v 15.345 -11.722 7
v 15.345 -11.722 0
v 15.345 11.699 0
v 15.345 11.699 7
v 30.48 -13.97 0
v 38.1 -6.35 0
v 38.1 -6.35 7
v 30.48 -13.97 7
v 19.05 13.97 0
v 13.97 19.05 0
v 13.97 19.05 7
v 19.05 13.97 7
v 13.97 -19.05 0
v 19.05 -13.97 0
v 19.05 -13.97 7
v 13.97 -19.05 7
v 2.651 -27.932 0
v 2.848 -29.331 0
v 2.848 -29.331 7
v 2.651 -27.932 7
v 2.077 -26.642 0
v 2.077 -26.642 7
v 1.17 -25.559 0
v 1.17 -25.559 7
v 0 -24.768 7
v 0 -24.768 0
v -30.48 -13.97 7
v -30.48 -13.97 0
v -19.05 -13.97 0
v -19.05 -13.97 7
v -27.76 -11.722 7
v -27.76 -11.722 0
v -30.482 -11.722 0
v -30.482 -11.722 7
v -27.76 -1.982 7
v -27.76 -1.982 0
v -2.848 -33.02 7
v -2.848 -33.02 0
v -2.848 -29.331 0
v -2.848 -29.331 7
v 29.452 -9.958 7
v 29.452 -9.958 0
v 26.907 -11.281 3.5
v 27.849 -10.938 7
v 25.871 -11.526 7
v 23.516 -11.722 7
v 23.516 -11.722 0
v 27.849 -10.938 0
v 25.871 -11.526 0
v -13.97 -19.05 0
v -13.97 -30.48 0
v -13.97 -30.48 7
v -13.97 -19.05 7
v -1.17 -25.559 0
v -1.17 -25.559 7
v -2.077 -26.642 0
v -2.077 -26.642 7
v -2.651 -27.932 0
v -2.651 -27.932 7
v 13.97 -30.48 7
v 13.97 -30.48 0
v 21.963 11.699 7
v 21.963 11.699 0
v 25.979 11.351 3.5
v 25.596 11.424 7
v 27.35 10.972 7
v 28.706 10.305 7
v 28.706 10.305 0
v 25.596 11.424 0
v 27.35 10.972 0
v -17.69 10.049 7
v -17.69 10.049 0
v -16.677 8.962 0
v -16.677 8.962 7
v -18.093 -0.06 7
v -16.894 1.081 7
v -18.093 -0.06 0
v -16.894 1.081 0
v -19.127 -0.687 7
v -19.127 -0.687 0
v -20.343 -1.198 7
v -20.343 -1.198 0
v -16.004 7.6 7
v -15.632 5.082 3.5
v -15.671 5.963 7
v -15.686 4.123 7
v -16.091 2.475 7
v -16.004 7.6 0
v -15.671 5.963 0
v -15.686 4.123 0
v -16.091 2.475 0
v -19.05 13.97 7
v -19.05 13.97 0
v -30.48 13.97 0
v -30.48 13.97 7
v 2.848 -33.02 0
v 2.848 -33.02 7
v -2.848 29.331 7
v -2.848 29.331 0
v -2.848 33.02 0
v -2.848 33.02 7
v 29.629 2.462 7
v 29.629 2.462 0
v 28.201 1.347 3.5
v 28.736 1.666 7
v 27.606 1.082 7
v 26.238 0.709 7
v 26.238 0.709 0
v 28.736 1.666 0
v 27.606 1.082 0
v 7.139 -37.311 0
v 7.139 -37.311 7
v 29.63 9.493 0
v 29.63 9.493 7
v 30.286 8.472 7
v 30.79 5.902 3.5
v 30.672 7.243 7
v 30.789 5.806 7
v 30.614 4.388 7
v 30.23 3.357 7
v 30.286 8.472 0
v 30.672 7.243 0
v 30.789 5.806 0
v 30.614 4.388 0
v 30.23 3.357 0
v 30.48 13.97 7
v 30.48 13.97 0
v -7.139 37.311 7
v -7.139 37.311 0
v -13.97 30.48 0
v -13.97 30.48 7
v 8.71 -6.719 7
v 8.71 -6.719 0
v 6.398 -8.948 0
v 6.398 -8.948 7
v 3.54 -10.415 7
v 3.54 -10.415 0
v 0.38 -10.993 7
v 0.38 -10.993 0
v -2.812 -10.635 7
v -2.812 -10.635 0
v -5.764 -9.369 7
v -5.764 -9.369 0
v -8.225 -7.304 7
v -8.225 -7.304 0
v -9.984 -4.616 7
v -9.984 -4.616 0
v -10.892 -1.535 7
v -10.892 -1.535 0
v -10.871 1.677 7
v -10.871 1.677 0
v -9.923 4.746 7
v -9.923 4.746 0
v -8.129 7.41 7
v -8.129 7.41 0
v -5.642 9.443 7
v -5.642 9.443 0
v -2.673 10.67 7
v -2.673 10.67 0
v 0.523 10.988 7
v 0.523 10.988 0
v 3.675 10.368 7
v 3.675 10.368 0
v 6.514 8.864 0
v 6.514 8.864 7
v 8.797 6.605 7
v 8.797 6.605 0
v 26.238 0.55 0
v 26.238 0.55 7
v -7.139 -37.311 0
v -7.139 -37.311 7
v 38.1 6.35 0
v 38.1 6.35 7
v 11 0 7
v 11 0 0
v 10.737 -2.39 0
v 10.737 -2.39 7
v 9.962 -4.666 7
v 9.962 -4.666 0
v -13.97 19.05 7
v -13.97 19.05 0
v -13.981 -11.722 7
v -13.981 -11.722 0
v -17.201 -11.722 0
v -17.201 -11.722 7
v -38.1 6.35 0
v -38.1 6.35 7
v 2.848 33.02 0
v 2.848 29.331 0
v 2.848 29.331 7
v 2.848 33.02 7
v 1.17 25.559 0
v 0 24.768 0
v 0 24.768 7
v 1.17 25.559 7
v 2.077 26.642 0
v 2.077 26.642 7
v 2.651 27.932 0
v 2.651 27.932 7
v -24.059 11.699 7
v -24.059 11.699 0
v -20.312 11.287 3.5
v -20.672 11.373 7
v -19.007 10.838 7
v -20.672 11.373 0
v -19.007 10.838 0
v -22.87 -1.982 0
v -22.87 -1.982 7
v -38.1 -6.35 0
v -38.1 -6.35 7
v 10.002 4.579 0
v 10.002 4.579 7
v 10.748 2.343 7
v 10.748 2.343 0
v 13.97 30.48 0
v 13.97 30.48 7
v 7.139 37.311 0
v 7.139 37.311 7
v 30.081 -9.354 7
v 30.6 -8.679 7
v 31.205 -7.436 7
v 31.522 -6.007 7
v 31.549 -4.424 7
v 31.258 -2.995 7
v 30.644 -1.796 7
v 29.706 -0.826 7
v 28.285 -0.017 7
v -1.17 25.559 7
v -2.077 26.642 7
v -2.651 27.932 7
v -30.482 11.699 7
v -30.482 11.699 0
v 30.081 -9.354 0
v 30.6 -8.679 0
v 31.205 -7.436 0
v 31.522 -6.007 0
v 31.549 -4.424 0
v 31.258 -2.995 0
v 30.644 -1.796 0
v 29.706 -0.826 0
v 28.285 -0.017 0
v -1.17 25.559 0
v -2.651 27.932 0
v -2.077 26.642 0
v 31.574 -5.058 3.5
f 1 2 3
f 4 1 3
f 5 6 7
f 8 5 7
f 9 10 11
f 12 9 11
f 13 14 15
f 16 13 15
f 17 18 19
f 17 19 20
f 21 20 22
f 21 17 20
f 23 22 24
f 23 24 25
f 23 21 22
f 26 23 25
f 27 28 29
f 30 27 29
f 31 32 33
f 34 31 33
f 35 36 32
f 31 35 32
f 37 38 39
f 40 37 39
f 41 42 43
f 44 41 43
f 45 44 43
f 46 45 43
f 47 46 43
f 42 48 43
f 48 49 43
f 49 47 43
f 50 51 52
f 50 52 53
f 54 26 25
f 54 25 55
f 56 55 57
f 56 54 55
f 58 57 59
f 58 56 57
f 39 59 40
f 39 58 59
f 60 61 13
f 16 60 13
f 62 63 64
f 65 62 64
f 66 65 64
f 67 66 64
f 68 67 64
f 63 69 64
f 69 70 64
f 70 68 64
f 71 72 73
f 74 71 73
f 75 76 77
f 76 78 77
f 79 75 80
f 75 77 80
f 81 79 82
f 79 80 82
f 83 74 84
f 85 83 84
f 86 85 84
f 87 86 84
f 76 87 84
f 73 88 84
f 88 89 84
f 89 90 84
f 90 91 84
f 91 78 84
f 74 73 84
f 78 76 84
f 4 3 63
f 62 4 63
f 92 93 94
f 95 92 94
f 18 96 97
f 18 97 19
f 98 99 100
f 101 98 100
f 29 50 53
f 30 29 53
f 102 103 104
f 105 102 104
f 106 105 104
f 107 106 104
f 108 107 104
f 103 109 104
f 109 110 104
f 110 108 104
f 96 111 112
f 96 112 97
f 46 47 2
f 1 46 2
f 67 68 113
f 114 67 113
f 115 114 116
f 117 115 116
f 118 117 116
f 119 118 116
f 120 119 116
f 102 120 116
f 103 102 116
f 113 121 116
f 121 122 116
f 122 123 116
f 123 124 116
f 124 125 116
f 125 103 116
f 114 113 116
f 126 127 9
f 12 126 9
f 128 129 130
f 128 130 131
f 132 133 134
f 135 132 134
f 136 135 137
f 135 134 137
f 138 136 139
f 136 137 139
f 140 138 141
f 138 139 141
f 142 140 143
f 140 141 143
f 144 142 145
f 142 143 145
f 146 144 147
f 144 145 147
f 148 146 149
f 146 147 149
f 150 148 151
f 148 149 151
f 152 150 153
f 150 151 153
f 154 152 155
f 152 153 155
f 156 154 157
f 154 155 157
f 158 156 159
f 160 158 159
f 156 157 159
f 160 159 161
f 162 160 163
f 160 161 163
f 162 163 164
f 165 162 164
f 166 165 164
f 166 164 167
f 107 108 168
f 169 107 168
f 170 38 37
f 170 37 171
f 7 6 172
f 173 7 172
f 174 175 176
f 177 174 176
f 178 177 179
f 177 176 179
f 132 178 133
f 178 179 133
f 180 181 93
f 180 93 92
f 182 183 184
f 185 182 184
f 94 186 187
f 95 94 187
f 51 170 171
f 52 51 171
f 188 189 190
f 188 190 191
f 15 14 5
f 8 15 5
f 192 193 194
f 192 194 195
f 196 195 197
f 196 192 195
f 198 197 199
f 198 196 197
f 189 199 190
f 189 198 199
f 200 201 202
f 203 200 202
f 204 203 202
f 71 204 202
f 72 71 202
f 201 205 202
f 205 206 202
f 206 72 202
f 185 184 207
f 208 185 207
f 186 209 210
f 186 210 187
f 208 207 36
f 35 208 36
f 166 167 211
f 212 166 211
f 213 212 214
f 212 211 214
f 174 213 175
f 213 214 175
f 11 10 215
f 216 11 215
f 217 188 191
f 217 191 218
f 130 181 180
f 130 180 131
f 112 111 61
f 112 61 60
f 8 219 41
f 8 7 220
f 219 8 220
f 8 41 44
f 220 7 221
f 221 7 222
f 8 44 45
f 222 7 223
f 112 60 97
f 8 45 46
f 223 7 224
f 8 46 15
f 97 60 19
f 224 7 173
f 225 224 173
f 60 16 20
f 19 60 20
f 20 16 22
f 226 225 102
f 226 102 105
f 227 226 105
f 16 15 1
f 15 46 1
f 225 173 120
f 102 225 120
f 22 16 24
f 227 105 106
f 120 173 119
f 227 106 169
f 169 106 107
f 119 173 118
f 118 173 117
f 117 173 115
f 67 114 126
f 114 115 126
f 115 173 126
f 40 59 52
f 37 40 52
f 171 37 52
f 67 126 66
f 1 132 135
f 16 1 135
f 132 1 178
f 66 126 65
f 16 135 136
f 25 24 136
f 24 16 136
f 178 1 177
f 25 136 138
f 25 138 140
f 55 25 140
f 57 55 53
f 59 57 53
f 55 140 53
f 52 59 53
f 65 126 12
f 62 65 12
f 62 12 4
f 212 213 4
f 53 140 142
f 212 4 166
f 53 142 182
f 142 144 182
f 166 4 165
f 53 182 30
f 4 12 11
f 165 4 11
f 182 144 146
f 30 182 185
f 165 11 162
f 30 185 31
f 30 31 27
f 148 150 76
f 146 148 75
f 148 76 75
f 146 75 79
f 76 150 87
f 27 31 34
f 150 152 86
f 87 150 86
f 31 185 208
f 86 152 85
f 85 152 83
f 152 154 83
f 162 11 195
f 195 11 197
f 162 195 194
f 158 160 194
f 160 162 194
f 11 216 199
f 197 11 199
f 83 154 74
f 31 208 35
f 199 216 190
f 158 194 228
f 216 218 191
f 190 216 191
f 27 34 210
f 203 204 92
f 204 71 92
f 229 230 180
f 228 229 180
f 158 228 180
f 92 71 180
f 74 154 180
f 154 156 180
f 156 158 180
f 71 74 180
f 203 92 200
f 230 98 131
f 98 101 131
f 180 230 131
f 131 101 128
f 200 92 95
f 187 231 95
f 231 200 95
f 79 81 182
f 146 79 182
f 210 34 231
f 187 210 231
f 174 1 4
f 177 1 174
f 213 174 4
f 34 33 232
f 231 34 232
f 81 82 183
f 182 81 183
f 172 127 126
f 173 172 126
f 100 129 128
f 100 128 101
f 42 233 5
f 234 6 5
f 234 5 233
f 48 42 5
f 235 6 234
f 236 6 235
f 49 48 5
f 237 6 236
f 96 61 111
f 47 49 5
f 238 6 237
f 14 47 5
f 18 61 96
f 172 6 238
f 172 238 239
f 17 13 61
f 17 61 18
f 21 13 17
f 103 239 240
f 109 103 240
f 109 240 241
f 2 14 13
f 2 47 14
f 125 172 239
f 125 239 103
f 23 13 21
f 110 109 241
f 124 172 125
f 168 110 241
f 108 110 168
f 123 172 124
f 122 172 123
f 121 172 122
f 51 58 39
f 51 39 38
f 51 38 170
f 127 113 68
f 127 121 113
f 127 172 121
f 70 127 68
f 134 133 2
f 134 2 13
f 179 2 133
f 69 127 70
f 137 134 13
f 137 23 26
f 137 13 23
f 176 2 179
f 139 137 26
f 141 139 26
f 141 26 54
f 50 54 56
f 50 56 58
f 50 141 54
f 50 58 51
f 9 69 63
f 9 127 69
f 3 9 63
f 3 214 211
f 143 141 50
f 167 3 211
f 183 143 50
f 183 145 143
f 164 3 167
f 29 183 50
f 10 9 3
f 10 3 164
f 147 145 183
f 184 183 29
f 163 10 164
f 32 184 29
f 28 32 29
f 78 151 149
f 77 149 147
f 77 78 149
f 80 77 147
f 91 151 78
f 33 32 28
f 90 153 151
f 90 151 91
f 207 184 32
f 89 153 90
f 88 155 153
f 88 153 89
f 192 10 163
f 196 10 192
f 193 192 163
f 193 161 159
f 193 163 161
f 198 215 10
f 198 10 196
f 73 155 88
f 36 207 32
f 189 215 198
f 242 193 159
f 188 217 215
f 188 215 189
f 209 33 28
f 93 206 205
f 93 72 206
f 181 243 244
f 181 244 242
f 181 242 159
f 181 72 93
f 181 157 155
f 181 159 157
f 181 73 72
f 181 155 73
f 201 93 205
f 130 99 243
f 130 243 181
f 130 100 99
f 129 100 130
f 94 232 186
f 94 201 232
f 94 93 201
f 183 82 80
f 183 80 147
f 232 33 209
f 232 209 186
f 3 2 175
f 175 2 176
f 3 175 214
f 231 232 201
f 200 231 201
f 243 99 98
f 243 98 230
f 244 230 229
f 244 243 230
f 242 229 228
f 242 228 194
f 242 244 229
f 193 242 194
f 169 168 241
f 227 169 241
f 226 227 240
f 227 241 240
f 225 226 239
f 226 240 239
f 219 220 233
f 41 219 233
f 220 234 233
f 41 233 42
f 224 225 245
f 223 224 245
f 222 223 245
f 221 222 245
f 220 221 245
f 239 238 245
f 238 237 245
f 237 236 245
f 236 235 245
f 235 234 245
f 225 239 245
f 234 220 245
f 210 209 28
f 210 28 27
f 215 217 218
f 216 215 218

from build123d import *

# Parameters (mm, degrees)
F0_W        = 24.13
F0_H        = 27.94
F0_W_2      = 27.94
F1_DEPTH    = 7
F0_H_2      = 24.13
F2_DEPTH    = 7
F3_SIZE     = 7.62
F4_SIZE     = 5.08
F5_W        = 5.6953141466
F5_H        = 27.5579802692
F5_H_2      = 20.2091857791
F6_DEPTH    = 46.736
F7_T1_DEPTH = 33.1282991577
F8_T1_DEPTH = 7


# Not quite as in the source:
# - a fillet or chamfer that OpenCascade refuses, or shapes differently, is made with other operations: its cross-section is extruded or revolved along the edge and cut away or added


with BuildPart() as f1:
    # F0 (on Top) → F1 (new body)
    with BuildSketch(Plane.XY):
        with Locations((-26.035, 0)):
            Rectangle(F0_W, F0_H)
        with BuildLine():
            Line((-22.8701785602, -1.9821503455), (-27.7604957957, -1.9821503455))
            Line((-27.7604957957, -1.9821503455), (-27.7604957957, -11.721775867))
            Line((-27.7604957957, -11.721775867), (-30.4824648231, -11.721775867))
            Line((-30.4824648231, -11.721775867), (-30.4824648231, 11.6994604529))
            Line((-30.4824648231, 11.6994604529), (-24.0594380975, 11.6994604529))
            add(Edge.make_bspline(
                [(-24.0594380975, 11.6994604529), (-19.7483722746, 11.6994604529), (-17.6902356183, 10.0488502329)],
                knots=[0, 0, 0, 1, 1, 1], degree=2))
            add(Edge.make_bspline(
                [(-17.6902356183, 10.0488502329), (-15.6320989621, 8.398240013), (-15.6320989621, 5.0816412169)],
                knots=[0, 0, 0, 1, 1, 1], degree=2))
            add(Edge.make_bspline(
                [(-15.6320989621, 5.0816412169), (-15.6320989621, 0.4373776788), (-20.3430020433, -1.1978541851)],
                knots=[0, 0, 0, 1, 1, 1], degree=2))
            Line((-20.3430020433, -1.1978541851), (-13.9814887421, -11.721775867))
            Line((-13.9814887421, -11.721775867), (-17.2006912829, -11.721775867))
            Line((-17.2006912829, -11.721775867), (-22.8701785602, -1.9821503455))
        make_face(mode=Mode.SUBTRACT)
        Rectangle(F0_W_2, F0_H)
        with BuildLine():
            ThreePointArc((8.7965986845, 6.6045326545), (10.4346199147, 3.4811933637), (11, 0))
            ThreePointArc((11, 0), (10.4117353498, -3.5490515643), (8.7098605443, -6.7185064783))
            add(Edge.make_bspline(
                [(8.7098605443, -6.7185064783), (8.1189739543, -7.8747447622), (7.281651607, -8.8229557447)],
                knots=[0.7056859188, 0.7056859188, 0.7056859188, 1, 1, 1], degree=2))
            add(Edge.make_bspline(
                [(7.281651607, -8.8229557447), (4.436655731, -12.0447213449), (-0.6228234215, -12.0447213449)],
                knots=[0, 0, 0, 1, 1, 1], degree=2))
            add(Edge.make_bspline(
                [(-0.6228234215, -12.0447213449), (-5.7950771853, -12.0447213449), (-8.6067532898, -8.8793430504)],
                knots=[0, 0, 0, 1, 1, 1], degree=2))
            add(Edge.make_bspline(
                [(-8.6067532898, -8.8793430504), (-11.4184293943, -5.7139647559), (-11.4184293943, 0.0529187766)],
                knots=[0, 0, 0, 1, 1, 1], degree=2))
            add(Edge.make_bspline(
                [(-11.4184293943, 0.0529187766), (-11.4184293943, 5.7736672408), (-8.5990641118, 8.9211041199)],
                knots=[0, 0, 0, 1, 1, 1], degree=2))
            add(Edge.make_bspline(
                [(-8.5990641118, 8.9211041199), (-5.7796988292, 12.068540999), (-0.5920667093, 12.068540999)],
                knots=[0, 0, 0, 1, 1, 1], degree=2))
            add(Edge.make_bspline(
                [(-0.5920667093, 12.068540999), (4.4571602058, 12.068540999), (7.2919038444, 8.8647168143)],
                knots=[0, 0, 0, 1, 1, 1], degree=2))
            add(Edge.make_bspline(
                [(7.2919038444, 8.8647168143), (8.1849092487, 7.8554430753), (8.7965986845, 6.6045326545)],
                knots=[0, 0, 0, 0.3150215745, 0.3150215745, 0.3150215745], degree=2))
        make_face(mode=Mode.SUBTRACT)
        with Locations((26.035, 0)):
            Rectangle(F0_W, F0_H)
        with BuildLine():
            Line((15.3450363151, -11.721775867), (15.3450363151, 11.6994604529))
            Line((15.3450363151, 11.6994604529), (21.9628555511, 11.6994604529))
            add(Edge.make_bspline(
                [(21.9628555511, 11.6994604529), (26.6224974453, 11.6994604529), (28.706264695, 10.3051561677)],
                knots=[0, 0, 0, 1, 1, 1], degree=2))
            add(Edge.make_bspline(
                [(28.706264695, 10.3051561677), (30.7900319448, 8.9108518825), (30.7900319448, 5.9018202082)],
                knots=[0, 0, 0, 1, 1, 1], degree=2))
            add(Edge.make_bspline(
                [(30.7900319448, 5.9018202082), (30.7900319448, 3.8154898992), (29.6289660602, 2.4621945635)],
                knots=[0, 0, 0, 1, 1, 1], degree=2))
            add(Edge.make_bspline(
                [(29.6289660602, 2.4621945635), (28.4679001757, 1.1088992279), (26.2380385431, 0.7090619697)],
                knots=[0, 0, 0, 1, 1, 1], degree=2))
            Line((26.2380385431, 0.7090619697), (26.2380385431, 0.5501522901))
            add(Edge.make_bspline(
                [(26.2380385431, 0.5501522901), (31.5743281052, -0.3622968377), (31.5743281052, -5.0578215628)],
                knots=[0, 0, 0, 1, 1, 1], degree=2))
            add(Edge.make_bspline(
                [(31.5743281052, -5.0578215628), (31.5743281052, -8.1950062045), (29.4521149653, -9.9583910358)],
                knots=[0, 0, 0, 1, 1, 1], degree=2))
            add(Edge.make_bspline(
                [(29.4521149653, -9.9583910358), (27.3299018253, -11.721775867), (23.5160695158, -11.721775867)],
                knots=[0, 0, 0, 1, 1, 1], degree=2))
            Line((23.5160695158, -11.721775867), (15.3450363151, -11.721775867))
        make_face(mode=Mode.SUBTRACT)
        with BuildLine():
            ThreePointArc((8.7098605443, -6.7185064783), (-10.9997668891, 0.0716127389), (8.7965986845, 6.6045326545))
            add(Edge.make_bspline(
                [(7.2919038444, 8.8647168143), (8.1849092487, 7.8554430753), (8.7965986845, 6.6045326545)],
                knots=[0, 0, 0, 0.3150215745, 0.3150215745, 0.3150215745], degree=2))
            add(Edge.make_bspline(
                [(-0.5920667093, 12.068540999), (4.4571602058, 12.068540999), (7.2919038444, 8.8647168143)],
                knots=[0, 0, 0, 1, 1, 1], degree=2))
            add(Edge.make_bspline(
                [(-8.5990641118, 8.9211041199), (-5.7796988292, 12.068540999), (-0.5920667093, 12.068540999)],
                knots=[0, 0, 0, 1, 1, 1], degree=2))
            add(Edge.make_bspline(
                [(-11.4184293943, 0.0529187766), (-11.4184293943, 5.7736672408), (-8.5990641118, 8.9211041199)],
                knots=[0, 0, 0, 1, 1, 1], degree=2))
            add(Edge.make_bspline(
                [(-8.6067532898, -8.8793430504), (-11.4184293943, -5.7139647559), (-11.4184293943, 0.0529187766)],
                knots=[0, 0, 0, 1, 1, 1], degree=2))
            add(Edge.make_bspline(
                [(-0.6228234215, -12.0447213449), (-5.7950771853, -12.0447213449), (-8.6067532898, -8.8793430504)],
                knots=[0, 0, 0, 1, 1, 1], degree=2))
            add(Edge.make_bspline(
                [(7.281651607, -8.8229557447), (4.436655731, -12.0447213449), (-0.6228234215, -12.0447213449)],
                knots=[0, 0, 0, 1, 1, 1], degree=2))
            add(Edge.make_bspline(
                [(8.7098605443, -6.7185064783), (8.1189739543, -7.8747447622), (7.281651607, -8.8229557447)],
                knots=[0.7056859188, 0.7056859188, 0.7056859188, 1, 1, 1], degree=2))
        make_face()
    extrude(amount=F1_DEPTH)

    # F0 (on Top) → F2 (join)
    with BuildSketch(Plane.XY):
        with Locations((-26.035, 0)):
            Rectangle(F0_W, F0_H)
        with BuildLine():
            Line((-22.8701785602, -1.9821503455), (-27.7604957957, -1.9821503455))
            Line((-27.7604957957, -1.9821503455), (-27.7604957957, -11.721775867))
            Line((-27.7604957957, -11.721775867), (-30.4824648231, -11.721775867))
            Line((-30.4824648231, -11.721775867), (-30.4824648231, 11.6994604529))
            Line((-30.4824648231, 11.6994604529), (-24.0594380975, 11.6994604529))
            add(Edge.make_bspline(
                [(-24.0594380975, 11.6994604529), (-19.7483722746, 11.6994604529), (-17.6902356183, 10.0488502329)],
                knots=[0, 0, 0, 1, 1, 1], degree=2))
            add(Edge.make_bspline(
                [(-17.6902356183, 10.0488502329), (-15.6320989621, 8.398240013), (-15.6320989621, 5.0816412169)],
                knots=[0, 0, 0, 1, 1, 1], degree=2))
            add(Edge.make_bspline(
                [(-15.6320989621, 5.0816412169), (-15.6320989621, 0.4373776788), (-20.3430020433, -1.1978541851)],
                knots=[0, 0, 0, 1, 1, 1], degree=2))
            Line((-20.3430020433, -1.1978541851), (-13.9814887421, -11.721775867))
            Line((-13.9814887421, -11.721775867), (-17.2006912829, -11.721775867))
            Line((-17.2006912829, -11.721775867), (-22.8701785602, -1.9821503455))
        make_face(mode=Mode.SUBTRACT)
        Rectangle(F0_W_2, F0_H)
        with BuildLine():
            ThreePointArc((8.7965986845, 6.6045326545), (10.4346199147, 3.4811933637), (11, 0))
            ThreePointArc((11, 0), (10.4117353498, -3.5490515643), (8.7098605443, -6.7185064783))
            add(Edge.make_bspline(
                [(8.7098605443, -6.7185064783), (8.1189739543, -7.8747447622), (7.281651607, -8.8229557447)],
                knots=[0.7056859188, 0.7056859188, 0.7056859188, 1, 1, 1], degree=2))
            add(Edge.make_bspline(
                [(7.281651607, -8.8229557447), (4.436655731, -12.0447213449), (-0.6228234215, -12.0447213449)],
                knots=[0, 0, 0, 1, 1, 1], degree=2))
            add(Edge.make_bspline(
                [(-0.6228234215, -12.0447213449), (-5.7950771853, -12.0447213449), (-8.6067532898, -8.8793430504)],
                knots=[0, 0, 0, 1, 1, 1], degree=2))
            add(Edge.make_bspline(
                [(-8.6067532898, -8.8793430504), (-11.4184293943, -5.7139647559), (-11.4184293943, 0.0529187766)],
                knots=[0, 0, 0, 1, 1, 1], degree=2))
            add(Edge.make_bspline(
                [(-11.4184293943, 0.0529187766), (-11.4184293943, 5.7736672408), (-8.5990641118, 8.9211041199)],
                knots=[0, 0, 0, 1, 1, 1], degree=2))
            add(Edge.make_bspline(
                [(-8.5990641118, 8.9211041199), (-5.7796988292, 12.068540999), (-0.5920667093, 12.068540999)],
                knots=[0, 0, 0, 1, 1, 1], degree=2))
            add(Edge.make_bspline(
                [(-0.5920667093, 12.068540999), (4.4571602058, 12.068540999), (7.2919038444, 8.8647168143)],
                knots=[0, 0, 0, 1, 1, 1], degree=2))
            add(Edge.make_bspline(
                [(7.2919038444, 8.8647168143), (8.1849092487, 7.8554430753), (8.7965986845, 6.6045326545)],
                knots=[0, 0, 0, 0.3150215745, 0.3150215745, 0.3150215745], degree=2))
        make_face(mode=Mode.SUBTRACT)
        with BuildLine():
            ThreePointArc((8.7098605443, -6.7185064783), (-10.9997668891, 0.0716127389), (8.7965986845, 6.6045326545))
            add(Edge.make_bspline(
                [(7.2919038444, 8.8647168143), (8.1849092487, 7.8554430753), (8.7965986845, 6.6045326545)],
                knots=[0, 0, 0, 0.3150215745, 0.3150215745, 0.3150215745], degree=2))
            add(Edge.make_bspline(
                [(-0.5920667093, 12.068540999), (4.4571602058, 12.068540999), (7.2919038444, 8.8647168143)],
                knots=[0, 0, 0, 1, 1, 1], degree=2))
            add(Edge.make_bspline(
                [(-8.5990641118, 8.9211041199), (-5.7796988292, 12.068540999), (-0.5920667093, 12.068540999)],
                knots=[0, 0, 0, 1, 1, 1], degree=2))
            add(Edge.make_bspline(
                [(-11.4184293943, 0.0529187766), (-11.4184293943, 5.7736672408), (-8.5990641118, 8.9211041199)],
                knots=[0, 0, 0, 1, 1, 1], degree=2))
            add(Edge.make_bspline(
                [(-8.6067532898, -8.8793430504), (-11.4184293943, -5.7139647559), (-11.4184293943, 0.0529187766)],
                knots=[0, 0, 0, 1, 1, 1], degree=2))
            add(Edge.make_bspline(
                [(-0.6228234215, -12.0447213449), (-5.7950771853, -12.0447213449), (-8.6067532898, -8.8793430504)],
                knots=[0, 0, 0, 1, 1, 1], degree=2))
            add(Edge.make_bspline(
                [(7.281651607, -8.8229557447), (4.436655731, -12.0447213449), (-0.6228234215, -12.0447213449)],
                knots=[0, 0, 0, 1, 1, 1], degree=2))
            add(Edge.make_bspline(
                [(8.7098605443, -6.7185064783), (8.1189739543, -7.8747447622), (7.281651607, -8.8229557447)],
                knots=[0.7056859188, 0.7056859188, 0.7056859188, 1, 1, 1], degree=2))
        make_face()
        with Locations((26.035, 0)):
            Rectangle(F0_W, F0_H)
        with BuildLine():
            Line((15.3450363151, -11.721775867), (15.3450363151, 11.6994604529))
            Line((15.3450363151, 11.6994604529), (21.9628555511, 11.6994604529))
            add(Edge.make_bspline(
                [(21.9628555511, 11.6994604529), (26.6224974453, 11.6994604529), (28.706264695, 10.3051561677)],
                knots=[0, 0, 0, 1, 1, 1], degree=2))
            add(Edge.make_bspline(
                [(28.706264695, 10.3051561677), (30.7900319448, 8.9108518825), (30.7900319448, 5.9018202082)],
                knots=[0, 0, 0, 1, 1, 1], degree=2))
            add(Edge.make_bspline(
                [(30.7900319448, 5.9018202082), (30.7900319448, 3.8154898992), (29.6289660602, 2.4621945635)],
                knots=[0, 0, 0, 1, 1, 1], degree=2))
            add(Edge.make_bspline(
                [(29.6289660602, 2.4621945635), (28.4679001757, 1.1088992279), (26.2380385431, 0.7090619697)],
                knots=[0, 0, 0, 1, 1, 1], degree=2))
            Line((26.2380385431, 0.7090619697), (26.2380385431, 0.5501522901))
            add(Edge.make_bspline(
                [(26.2380385431, 0.5501522901), (31.5743281052, -0.3622968377), (31.5743281052, -5.0578215628)],
                knots=[0, 0, 0, 1, 1, 1], degree=2))
            add(Edge.make_bspline(
                [(31.5743281052, -5.0578215628), (31.5743281052, -8.1950062045), (29.4521149653, -9.9583910358)],
                knots=[0, 0, 0, 1, 1, 1], degree=2))
            add(Edge.make_bspline(
                [(29.4521149653, -9.9583910358), (27.3299018253, -11.721775867), (23.5160695158, -11.721775867)],
                knots=[0, 0, 0, 1, 1, 1], degree=2))
            Line((23.5160695158, -11.721775867), (15.3450363151, -11.721775867))
        make_face(mode=Mode.SUBTRACT)
        with Locations((0, 26.035)):
            Rectangle(F0_W_2, F0_H_2)
        with Locations((0, -26.035)):
            Rectangle(F0_W_2, F0_H_2)
    extrude(amount=F2_DEPTH)

    # F3
    f3_edges = [f1.edges().sort_by_distance(p)[0] for p in [
        (13.97, 38.1, 3.5),
        (-13.97, 38.1, 3.5),
        (13.97, -38.1, 3.5),
        (-13.97, -38.1, 3.5),
        (38.1, -13.97, 3.5),
        (38.1, 13.97, 3.5),
        (-38.1, -13.97, 3.5),
        (-38.1, 13.97, 3.5),
    ]]
    chamfer(f3_edges, length=F3_SIZE)

    # F4
    f4_edges = [f1.edges().sort_by_distance(p)[0] for p in [
        (-13.97, -13.97, 3.5),
        (13.97, -13.97, 3.5),
        (-13.97, 13.97, 3.5),
        (13.97, 13.97, 3.5),
    ]]
    chamfer(f4_edges, length=F4_SIZE)

    # F5 (on Top) → F6 (cut)
    with BuildSketch(Plane.XY):
        with Locations((0, 38.0300115794)):
            Rectangle(F5_W, F5_H)
        with Locations((0, -34.3556143343)):
            Rectangle(F5_W, F5_H_2)
    extrude(amount=F6_DEPTH, mode=Mode.SUBTRACT)

    # F7: chamfer of 5.08 on 4 edges, made by hand

    # F7_s2 → F7_t1 (cut)
    with BuildSketch(Plane.XY.offset(-13.0641495789)):
        Polygon((2.8476570733, 33.02), (7.9276570733, 38.1), (2.8476570733, 38.1), align=None)
        Polygon((-7.9276570733, 38.1), (-2.8476570733, 33.02), (-2.8476570733, 38.1), align=None)
        Polygon((-2.8476570733, -33.02), (-7.9276570733, -38.1), (-2.8476570733, -38.1), align=None)
        Polygon((7.9276570733, -38.1), (2.8476570733, -33.02), (2.8476570733, -38.1), align=None)
    extrude(amount=F7_T1_DEPTH, mode=Mode.SUBTRACT)

    # F8: fillet of radius 5.08 on 4 edges, made by hand

    # F8_s2 → F8_t1 (join)
    with BuildSketch(Plane.XY):
        with BuildLine():
            ThreePointArc((-2.2323429267, 24.2510214448), (1.3597595217, 25.7389189964), (2.8476570733, 29.3310214448))
            Line((2.8476570733, 29.3310214448), (2.8476570733, 24.2510214448))
            Line((2.8476570733, 24.2510214448), (-2.2323429267, 24.2510214448))
        make_face()
        with BuildLine():
            ThreePointArc((-2.8476570733, 29.3310214448), (-1.3597595217, 25.7389189964), (2.2323429267, 24.2510214448))
            Line((2.2323429267, 24.2510214448), (-2.8476570733, 24.2510214448))
            Line((-2.8476570733, 24.2510214448), (-2.8476570733, 29.3310214448))
        make_face()
        with BuildLine():
            ThreePointArc((2.8476570733, -29.3310214448), (1.3597595217, -25.7389189964), (-2.2323429267, -24.2510214448))
            Line((-2.2323429267, -24.2510214448), (2.8476570733, -24.2510214448))
            Line((2.8476570733, -24.2510214448), (2.8476570733, -29.3310214448))
        make_face()
        with BuildLine():
            ThreePointArc((2.2323429267, -24.2510214448), (-1.3597595217, -25.7389189964), (-2.8476570733, -29.3310214448))
            Line((-2.8476570733, -29.3310214448), (-2.8476570733, -24.2510214448))
            Line((-2.8476570733, -24.2510214448), (2.2323429267, -24.2510214448))
        make_face()
    extrude(amount=F8_T1_DEPTH)


solid = f1.part
